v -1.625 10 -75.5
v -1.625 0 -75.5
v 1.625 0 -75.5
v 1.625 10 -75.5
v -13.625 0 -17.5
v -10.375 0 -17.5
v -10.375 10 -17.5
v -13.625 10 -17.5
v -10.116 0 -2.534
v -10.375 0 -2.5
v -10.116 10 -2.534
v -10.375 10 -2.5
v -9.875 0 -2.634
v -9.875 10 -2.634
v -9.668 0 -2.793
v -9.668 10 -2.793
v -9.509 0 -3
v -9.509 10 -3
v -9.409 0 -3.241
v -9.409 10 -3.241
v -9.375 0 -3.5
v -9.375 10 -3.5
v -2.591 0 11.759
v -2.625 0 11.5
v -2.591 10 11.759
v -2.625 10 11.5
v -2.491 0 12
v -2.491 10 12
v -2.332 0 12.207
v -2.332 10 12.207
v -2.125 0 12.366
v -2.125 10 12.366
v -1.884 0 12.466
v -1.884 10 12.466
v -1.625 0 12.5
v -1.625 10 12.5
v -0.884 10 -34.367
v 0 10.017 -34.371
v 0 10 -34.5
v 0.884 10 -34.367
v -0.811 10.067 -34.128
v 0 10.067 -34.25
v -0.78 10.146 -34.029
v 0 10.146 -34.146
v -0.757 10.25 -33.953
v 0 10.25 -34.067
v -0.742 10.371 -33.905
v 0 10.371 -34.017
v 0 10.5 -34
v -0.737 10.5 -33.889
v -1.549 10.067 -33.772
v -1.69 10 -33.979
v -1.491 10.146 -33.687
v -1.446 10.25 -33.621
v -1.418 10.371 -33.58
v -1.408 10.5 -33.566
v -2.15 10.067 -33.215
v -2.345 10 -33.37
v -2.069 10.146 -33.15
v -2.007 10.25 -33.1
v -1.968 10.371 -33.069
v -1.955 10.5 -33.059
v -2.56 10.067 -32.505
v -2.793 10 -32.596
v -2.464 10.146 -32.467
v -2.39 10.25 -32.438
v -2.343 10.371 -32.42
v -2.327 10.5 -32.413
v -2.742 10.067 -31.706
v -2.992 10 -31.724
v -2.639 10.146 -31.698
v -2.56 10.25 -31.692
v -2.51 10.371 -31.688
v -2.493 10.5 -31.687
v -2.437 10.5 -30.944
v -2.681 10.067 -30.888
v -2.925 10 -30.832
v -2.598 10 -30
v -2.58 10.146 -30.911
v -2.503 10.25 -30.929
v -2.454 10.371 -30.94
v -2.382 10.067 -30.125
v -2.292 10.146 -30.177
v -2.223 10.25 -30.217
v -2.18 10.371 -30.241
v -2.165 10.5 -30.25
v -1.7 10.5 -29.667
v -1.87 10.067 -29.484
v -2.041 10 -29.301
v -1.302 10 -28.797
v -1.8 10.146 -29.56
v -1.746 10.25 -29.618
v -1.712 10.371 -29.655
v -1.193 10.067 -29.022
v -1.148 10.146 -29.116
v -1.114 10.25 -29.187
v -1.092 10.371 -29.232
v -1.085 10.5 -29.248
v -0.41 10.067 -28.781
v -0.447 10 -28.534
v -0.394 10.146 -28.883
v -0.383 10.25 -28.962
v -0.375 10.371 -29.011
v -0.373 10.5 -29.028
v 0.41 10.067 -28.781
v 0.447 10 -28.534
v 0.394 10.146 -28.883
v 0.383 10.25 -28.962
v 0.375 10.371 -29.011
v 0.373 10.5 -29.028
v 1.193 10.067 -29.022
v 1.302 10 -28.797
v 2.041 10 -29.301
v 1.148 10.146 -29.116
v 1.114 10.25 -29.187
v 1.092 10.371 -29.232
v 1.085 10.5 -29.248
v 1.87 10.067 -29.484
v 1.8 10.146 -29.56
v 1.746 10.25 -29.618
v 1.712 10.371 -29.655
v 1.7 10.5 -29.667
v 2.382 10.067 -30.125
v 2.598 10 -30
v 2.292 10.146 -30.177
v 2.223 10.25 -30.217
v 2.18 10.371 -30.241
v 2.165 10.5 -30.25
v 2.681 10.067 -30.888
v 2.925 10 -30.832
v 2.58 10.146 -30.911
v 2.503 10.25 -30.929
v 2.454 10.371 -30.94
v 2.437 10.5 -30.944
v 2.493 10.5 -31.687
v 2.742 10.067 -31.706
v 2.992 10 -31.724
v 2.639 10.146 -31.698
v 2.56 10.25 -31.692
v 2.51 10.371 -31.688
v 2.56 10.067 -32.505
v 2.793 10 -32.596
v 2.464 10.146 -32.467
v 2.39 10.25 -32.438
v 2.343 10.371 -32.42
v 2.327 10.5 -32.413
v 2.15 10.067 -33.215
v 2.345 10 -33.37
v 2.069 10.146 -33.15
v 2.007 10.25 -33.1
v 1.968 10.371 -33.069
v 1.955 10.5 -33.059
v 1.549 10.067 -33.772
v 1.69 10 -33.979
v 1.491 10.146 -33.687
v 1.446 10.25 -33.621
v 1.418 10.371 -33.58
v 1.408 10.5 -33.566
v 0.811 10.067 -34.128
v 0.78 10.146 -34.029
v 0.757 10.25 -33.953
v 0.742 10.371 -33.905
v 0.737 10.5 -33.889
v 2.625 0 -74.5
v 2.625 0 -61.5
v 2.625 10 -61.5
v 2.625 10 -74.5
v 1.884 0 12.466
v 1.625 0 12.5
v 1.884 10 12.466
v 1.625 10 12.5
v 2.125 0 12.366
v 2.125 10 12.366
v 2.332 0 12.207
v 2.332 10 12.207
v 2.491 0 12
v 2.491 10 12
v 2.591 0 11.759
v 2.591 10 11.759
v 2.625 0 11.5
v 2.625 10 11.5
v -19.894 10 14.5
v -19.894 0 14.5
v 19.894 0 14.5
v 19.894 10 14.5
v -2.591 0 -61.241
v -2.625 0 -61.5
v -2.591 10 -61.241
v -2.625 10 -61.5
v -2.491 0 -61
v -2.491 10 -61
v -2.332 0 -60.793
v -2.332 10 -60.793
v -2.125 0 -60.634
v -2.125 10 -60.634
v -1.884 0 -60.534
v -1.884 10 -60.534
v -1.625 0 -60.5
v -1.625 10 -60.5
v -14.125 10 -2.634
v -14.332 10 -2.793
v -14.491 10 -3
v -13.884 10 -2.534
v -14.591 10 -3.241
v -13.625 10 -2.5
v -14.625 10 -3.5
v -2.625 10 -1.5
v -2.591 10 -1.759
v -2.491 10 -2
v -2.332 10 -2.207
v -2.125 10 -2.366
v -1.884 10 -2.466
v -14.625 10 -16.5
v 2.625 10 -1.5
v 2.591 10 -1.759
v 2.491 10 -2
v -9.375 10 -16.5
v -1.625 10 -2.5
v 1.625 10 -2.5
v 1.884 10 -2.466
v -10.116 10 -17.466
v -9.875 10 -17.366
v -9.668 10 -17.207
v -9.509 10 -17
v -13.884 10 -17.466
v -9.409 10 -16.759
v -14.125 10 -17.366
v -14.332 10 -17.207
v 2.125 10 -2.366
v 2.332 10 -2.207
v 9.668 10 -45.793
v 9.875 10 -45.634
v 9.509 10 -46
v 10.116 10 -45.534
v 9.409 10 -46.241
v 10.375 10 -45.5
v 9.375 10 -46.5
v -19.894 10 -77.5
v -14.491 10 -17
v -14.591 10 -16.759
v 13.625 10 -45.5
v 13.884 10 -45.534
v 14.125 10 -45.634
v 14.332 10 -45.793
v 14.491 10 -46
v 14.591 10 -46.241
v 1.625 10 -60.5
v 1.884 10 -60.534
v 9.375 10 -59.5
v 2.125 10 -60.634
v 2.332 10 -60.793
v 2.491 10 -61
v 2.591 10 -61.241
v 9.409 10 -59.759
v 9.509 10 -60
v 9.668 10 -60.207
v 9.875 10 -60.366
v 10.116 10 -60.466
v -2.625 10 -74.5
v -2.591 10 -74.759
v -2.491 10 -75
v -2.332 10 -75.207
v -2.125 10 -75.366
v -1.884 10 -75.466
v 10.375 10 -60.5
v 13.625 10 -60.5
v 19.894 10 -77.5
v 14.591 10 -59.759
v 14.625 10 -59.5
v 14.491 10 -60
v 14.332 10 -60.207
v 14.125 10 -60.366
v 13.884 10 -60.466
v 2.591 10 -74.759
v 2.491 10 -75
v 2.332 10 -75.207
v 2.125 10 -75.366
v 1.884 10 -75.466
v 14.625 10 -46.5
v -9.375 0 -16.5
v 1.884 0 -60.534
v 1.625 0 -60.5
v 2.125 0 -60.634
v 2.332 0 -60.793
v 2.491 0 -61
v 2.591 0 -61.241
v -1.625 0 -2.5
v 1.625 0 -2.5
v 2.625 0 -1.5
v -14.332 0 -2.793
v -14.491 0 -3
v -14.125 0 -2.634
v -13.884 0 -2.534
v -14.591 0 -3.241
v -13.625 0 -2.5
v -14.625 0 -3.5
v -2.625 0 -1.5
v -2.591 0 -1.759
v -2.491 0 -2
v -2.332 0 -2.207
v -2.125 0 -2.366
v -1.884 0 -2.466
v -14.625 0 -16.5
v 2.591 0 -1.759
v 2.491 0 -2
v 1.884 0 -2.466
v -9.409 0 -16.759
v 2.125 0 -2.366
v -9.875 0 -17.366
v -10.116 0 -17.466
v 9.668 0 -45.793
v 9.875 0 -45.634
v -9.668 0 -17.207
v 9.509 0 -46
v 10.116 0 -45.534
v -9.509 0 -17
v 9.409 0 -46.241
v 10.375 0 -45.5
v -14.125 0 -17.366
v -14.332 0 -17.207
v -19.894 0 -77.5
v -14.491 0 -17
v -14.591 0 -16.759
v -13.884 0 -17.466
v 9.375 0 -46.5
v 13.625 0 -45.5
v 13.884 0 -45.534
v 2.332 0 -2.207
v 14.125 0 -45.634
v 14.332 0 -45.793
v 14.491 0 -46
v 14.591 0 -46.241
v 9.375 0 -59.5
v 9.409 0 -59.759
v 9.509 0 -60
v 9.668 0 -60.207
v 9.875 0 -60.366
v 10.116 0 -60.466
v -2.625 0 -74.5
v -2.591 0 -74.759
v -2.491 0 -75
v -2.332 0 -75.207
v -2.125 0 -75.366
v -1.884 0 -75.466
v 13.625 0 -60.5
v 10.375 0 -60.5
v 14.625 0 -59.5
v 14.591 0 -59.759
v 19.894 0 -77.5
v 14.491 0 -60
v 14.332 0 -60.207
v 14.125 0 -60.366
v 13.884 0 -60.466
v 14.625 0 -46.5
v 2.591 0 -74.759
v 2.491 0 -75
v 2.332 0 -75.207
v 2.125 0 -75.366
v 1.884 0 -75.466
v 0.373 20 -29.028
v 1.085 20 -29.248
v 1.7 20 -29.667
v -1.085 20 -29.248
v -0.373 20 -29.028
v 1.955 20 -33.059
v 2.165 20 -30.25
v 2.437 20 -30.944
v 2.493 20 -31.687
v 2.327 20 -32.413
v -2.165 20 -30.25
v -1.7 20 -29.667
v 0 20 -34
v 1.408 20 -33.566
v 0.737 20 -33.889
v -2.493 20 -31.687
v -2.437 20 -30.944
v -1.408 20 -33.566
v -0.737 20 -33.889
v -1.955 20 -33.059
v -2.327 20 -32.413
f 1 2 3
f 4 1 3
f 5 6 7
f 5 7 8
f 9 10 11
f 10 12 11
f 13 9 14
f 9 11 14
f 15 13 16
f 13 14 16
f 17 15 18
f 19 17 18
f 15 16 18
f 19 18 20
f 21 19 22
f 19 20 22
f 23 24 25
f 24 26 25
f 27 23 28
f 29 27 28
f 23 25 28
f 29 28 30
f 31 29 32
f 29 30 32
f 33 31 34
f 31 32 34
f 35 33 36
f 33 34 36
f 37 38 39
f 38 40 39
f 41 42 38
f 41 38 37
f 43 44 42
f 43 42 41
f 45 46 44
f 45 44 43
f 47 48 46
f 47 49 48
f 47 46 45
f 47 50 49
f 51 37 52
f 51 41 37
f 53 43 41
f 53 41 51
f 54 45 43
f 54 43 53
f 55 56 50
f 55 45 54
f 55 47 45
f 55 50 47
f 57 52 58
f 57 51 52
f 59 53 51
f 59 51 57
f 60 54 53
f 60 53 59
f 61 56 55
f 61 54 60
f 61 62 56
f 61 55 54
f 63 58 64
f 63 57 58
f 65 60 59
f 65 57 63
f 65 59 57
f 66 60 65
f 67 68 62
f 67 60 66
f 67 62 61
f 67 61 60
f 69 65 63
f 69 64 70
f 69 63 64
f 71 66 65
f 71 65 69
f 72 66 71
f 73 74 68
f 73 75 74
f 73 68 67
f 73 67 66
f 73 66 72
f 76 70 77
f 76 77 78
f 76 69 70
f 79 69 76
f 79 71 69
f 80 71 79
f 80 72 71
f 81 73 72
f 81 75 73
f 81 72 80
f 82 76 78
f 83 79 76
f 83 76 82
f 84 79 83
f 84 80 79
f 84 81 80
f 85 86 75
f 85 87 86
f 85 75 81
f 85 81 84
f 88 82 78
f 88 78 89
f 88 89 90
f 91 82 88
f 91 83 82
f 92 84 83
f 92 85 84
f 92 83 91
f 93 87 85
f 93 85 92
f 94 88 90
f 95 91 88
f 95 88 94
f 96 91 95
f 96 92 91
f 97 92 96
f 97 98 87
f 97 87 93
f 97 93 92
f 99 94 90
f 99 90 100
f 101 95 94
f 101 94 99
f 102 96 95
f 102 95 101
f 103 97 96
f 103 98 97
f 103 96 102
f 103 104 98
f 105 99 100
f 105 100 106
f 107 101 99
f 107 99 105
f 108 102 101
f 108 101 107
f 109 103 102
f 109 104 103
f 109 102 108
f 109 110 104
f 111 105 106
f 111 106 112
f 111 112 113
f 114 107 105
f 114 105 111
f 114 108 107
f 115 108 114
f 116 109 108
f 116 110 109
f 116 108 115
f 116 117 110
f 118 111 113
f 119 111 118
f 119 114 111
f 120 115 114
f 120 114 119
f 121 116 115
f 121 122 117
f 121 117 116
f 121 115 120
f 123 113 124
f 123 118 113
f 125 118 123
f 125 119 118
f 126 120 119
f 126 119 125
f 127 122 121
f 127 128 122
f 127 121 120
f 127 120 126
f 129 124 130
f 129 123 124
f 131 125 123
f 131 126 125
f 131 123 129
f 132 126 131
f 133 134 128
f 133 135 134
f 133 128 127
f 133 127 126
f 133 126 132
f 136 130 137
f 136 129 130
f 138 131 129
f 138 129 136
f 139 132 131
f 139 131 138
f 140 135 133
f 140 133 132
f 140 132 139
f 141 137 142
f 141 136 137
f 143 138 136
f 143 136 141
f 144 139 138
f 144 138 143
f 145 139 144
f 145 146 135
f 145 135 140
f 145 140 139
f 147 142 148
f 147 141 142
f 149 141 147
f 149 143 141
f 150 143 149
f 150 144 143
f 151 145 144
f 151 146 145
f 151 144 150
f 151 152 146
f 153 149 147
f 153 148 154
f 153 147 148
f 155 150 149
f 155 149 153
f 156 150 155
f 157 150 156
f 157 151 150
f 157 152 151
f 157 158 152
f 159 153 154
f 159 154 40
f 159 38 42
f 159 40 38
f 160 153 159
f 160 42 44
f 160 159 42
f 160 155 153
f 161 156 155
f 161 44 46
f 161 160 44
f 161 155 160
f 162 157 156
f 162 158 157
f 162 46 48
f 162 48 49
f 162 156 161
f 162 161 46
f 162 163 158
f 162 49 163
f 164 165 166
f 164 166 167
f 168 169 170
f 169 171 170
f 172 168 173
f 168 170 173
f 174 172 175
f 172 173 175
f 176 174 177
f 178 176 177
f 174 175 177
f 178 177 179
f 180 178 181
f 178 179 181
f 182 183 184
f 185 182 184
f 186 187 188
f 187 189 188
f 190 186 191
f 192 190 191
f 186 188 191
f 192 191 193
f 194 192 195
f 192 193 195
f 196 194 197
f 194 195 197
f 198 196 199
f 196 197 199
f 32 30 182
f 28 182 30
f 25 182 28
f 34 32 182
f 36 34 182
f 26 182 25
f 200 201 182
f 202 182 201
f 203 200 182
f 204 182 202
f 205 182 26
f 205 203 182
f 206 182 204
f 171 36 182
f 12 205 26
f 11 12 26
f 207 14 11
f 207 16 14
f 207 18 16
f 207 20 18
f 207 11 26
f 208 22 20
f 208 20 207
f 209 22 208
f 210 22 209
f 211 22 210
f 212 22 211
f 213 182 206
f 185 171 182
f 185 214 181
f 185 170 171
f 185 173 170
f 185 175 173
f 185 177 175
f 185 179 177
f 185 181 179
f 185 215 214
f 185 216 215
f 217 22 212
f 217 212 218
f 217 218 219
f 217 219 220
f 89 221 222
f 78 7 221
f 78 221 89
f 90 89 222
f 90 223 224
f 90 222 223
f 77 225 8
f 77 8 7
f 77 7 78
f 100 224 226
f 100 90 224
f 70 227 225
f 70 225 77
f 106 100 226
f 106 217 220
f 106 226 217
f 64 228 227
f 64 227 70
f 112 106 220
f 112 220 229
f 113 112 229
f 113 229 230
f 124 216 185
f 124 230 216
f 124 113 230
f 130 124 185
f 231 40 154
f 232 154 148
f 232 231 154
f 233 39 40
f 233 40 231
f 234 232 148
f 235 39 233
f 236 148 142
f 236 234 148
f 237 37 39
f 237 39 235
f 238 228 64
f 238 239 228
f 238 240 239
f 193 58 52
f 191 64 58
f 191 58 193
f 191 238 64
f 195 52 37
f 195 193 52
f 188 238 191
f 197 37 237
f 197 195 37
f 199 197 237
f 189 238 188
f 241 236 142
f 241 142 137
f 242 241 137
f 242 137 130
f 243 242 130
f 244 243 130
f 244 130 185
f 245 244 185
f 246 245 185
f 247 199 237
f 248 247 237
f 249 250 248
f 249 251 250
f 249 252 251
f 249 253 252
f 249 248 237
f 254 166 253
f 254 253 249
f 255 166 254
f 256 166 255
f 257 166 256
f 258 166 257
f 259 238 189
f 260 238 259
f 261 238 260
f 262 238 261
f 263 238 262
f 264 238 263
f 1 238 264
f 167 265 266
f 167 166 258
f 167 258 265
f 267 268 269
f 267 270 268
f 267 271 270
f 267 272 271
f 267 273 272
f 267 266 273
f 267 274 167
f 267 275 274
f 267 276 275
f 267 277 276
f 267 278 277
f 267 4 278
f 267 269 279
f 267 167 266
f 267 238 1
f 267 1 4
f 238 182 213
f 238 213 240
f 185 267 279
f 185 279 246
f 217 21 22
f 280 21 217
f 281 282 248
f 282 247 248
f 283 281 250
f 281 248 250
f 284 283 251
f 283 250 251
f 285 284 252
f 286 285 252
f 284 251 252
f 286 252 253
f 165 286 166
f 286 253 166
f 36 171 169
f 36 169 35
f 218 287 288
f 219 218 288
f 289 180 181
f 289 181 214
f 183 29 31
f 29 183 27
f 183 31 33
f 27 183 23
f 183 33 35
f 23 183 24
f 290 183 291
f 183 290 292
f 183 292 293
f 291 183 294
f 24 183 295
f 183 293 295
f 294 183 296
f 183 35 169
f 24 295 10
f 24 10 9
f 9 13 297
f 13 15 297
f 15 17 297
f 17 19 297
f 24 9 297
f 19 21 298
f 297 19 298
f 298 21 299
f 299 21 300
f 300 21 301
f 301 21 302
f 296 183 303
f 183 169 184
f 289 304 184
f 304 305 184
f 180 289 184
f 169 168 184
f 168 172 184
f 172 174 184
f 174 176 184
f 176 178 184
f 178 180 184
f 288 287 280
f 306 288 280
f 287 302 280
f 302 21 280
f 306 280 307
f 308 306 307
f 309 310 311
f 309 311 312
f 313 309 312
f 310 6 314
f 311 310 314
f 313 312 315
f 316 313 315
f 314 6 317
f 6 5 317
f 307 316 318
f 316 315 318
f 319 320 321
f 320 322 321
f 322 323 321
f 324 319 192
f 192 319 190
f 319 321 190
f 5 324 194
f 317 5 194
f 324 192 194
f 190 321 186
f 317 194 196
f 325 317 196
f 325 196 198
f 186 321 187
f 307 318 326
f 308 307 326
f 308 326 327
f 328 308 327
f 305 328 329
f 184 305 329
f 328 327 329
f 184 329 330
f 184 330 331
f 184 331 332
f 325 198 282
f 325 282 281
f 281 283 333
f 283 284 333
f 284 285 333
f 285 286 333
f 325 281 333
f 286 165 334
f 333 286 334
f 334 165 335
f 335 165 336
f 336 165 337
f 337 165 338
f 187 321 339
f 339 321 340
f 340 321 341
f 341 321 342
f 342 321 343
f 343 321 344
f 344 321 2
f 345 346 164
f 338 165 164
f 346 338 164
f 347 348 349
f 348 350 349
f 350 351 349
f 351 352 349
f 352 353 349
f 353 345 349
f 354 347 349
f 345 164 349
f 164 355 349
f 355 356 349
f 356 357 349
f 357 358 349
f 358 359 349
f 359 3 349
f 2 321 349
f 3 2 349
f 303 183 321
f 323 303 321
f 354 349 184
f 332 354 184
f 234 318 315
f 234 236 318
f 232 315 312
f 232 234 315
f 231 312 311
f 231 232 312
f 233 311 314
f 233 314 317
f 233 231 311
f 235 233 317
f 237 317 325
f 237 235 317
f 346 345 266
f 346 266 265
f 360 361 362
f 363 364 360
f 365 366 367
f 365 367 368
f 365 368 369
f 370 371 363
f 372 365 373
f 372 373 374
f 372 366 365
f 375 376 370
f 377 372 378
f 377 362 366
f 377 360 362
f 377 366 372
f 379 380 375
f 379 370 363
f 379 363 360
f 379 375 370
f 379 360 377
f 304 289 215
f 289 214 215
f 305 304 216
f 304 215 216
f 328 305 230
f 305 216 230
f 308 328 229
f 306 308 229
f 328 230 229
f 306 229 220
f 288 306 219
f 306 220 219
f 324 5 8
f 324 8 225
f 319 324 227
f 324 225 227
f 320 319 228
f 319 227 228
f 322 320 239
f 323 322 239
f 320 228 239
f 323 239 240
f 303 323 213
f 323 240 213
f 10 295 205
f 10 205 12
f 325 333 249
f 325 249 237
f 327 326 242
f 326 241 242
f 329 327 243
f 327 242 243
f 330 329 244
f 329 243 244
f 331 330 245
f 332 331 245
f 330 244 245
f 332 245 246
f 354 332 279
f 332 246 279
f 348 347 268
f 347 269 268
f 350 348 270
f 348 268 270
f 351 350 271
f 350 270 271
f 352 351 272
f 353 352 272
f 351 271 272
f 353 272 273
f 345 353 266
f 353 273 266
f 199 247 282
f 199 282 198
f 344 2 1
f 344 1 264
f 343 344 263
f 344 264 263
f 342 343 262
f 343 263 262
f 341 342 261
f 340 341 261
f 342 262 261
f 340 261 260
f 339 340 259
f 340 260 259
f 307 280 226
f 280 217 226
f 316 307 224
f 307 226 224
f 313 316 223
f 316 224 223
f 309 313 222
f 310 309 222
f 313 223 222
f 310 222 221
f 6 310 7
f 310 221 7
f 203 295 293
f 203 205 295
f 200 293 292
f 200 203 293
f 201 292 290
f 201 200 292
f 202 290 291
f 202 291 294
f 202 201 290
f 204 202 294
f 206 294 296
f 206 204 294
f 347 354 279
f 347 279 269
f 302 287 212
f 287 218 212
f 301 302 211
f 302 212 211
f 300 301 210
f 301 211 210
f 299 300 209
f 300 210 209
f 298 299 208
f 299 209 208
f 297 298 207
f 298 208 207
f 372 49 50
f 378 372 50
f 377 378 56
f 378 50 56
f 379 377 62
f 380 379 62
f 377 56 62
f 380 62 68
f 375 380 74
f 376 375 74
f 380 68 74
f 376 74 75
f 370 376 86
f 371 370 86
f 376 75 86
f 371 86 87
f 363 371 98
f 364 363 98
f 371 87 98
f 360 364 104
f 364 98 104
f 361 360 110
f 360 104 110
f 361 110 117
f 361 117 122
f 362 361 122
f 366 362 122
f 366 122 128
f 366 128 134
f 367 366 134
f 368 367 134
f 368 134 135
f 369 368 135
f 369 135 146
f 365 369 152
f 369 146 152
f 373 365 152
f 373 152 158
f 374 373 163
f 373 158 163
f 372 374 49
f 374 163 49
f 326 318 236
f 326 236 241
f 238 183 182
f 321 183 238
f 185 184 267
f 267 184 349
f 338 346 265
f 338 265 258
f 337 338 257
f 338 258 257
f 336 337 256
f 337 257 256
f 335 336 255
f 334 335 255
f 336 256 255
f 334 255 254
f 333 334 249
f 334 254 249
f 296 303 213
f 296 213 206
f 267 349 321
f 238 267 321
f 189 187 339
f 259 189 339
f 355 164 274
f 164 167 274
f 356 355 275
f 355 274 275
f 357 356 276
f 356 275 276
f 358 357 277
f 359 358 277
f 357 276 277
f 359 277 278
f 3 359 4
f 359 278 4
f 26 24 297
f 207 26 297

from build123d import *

# Parameters (mm, degrees)
BOSS_EXTRUDE1_DEPTH  = 10
FILLET2_R            = 1
FILLET2_OF_MIRROR1_R = 1
CUT_EXTRUDE1_DEPTH   = 81.635062113
FILLET3_R            = 1
SKETCH5_R            = 2.5
BOSS_EXTRUDE2_DEPTH  = 10
FILLET1_R            = 0.5


with BuildPart() as part:
    # Sketch2 → Boss-Extrude1 (new body)
    with BuildSketch(Plane(origin=(0, 0, 0), x_dir=(1, 0, 0), z_dir=(0, 1, 0))):
        Polygon((-19.893799085, 77.5), (0, 77.5), (0, 75.5), (-2.625, 75.5), (-2.625, 73), (-2.625, 63), (-2.625, 60.5), (0, 60.5), (0, 60.375), (0, 2.5), (-2.625, 2.5), (-2.625, 0), (-2.625, -10), (-2.625, -12.5), (0, -12.5), (0, -14.5), (-19.893799085, -14.5), align=None)
    boss_extrude1 = extrude(amount=BOSS_EXTRUDE1_DEPTH)

    # Fillet2
    fillet2_edges = [part.edges().sort_by_distance(p)[0] for p in [
        (-2.625, 5, 12.5),
        (-2.625, 5, -2.5),
        (-2.625, 5, -60.5),
        (-2.625, 5, -75.5),
    ]]
    fillet(fillet2_edges, radius=FILLET2_R)

    # Mirror1: Boss-Extrude1 across Right Plane
    add(boss_extrude1.mirror(Plane(origin=(0, 0, 0), x_dir=(0, 0, -1), z_dir=(1, 0, 0))))

    # Fillet2 of Mirror1
    fillet2_of_mirror1_edges = [part.edges().sort_by_distance(p)[0] for p in [
        (2.625, 5, 12.5),
        (2.625, 5, -2.5),
        (2.625, 5, -60.5),
        (2.625, 5, -75.5),
    ]]
    fillet(fillet2_of_mirror1_edges, radius=FILLET2_OF_MIRROR1_R)

    # Sketch4 → Cut-Extrude1 (cut, through all)
    with BuildSketch(Plane(origin=(0, 0, 0), x_dir=(1, 0, 0), z_dir=(0, 1, 0))):
        Polygon((-14.625, 15), (-14.625, 5), (-14.625, 2.5), (-12, 2.5), (-9.375, 2.5), (-9.375, 5), (-9.375, 15), (-9.375, 17.5), (-12, 17.5), (-14.625, 17.5), align=None)
        Polygon((9.375, 58), (9.375, 48), (9.375, 45.5), (12, 45.5), (14.625, 45.5), (14.625, 48), (14.625, 58), (14.625, 60.5), (12, 60.5), (9.375, 60.5), align=None)
    extrude(amount=CUT_EXTRUDE1_DEPTH, mode=Mode.SUBTRACT)

    # Fillet3
    fillet3_edges = [part.edges().sort_by_distance(p)[0] for p in [
        (-14.625, 5, -17.5),
        (-14.625, 5, -2.5),
        (-9.375, 5, -2.5),
        (-9.375, 5, -17.5),
        (14.625, 5, -60.5),
        (9.375, 5, -60.5),
        (9.375, 5, -45.5),
        (14.625, 5, -45.5),
    ]]
    fillet(fillet3_edges, radius=FILLET3_R)

    # Sketch5 → Boss-Extrude2 (add)
    with BuildSketch(Plane(origin=(0, 10, 0), x_dir=(1, 0, 0), z_dir=(0, 1, 0))):
        with Locations(Location((0, 31.5, 0), (0, 0, 90))):
            Circle(SKETCH5_R)
    extrude(amount=BOSS_EXTRUDE2_DEPTH)

    # Fillet1
    fillet1_edges = [part.edges().sort_by_distance(p)[0] for p in [
        (0, 10, -29),
    ]]
    fillet(fillet1_edges, radius=FILLET1_R)


solid = part.part
